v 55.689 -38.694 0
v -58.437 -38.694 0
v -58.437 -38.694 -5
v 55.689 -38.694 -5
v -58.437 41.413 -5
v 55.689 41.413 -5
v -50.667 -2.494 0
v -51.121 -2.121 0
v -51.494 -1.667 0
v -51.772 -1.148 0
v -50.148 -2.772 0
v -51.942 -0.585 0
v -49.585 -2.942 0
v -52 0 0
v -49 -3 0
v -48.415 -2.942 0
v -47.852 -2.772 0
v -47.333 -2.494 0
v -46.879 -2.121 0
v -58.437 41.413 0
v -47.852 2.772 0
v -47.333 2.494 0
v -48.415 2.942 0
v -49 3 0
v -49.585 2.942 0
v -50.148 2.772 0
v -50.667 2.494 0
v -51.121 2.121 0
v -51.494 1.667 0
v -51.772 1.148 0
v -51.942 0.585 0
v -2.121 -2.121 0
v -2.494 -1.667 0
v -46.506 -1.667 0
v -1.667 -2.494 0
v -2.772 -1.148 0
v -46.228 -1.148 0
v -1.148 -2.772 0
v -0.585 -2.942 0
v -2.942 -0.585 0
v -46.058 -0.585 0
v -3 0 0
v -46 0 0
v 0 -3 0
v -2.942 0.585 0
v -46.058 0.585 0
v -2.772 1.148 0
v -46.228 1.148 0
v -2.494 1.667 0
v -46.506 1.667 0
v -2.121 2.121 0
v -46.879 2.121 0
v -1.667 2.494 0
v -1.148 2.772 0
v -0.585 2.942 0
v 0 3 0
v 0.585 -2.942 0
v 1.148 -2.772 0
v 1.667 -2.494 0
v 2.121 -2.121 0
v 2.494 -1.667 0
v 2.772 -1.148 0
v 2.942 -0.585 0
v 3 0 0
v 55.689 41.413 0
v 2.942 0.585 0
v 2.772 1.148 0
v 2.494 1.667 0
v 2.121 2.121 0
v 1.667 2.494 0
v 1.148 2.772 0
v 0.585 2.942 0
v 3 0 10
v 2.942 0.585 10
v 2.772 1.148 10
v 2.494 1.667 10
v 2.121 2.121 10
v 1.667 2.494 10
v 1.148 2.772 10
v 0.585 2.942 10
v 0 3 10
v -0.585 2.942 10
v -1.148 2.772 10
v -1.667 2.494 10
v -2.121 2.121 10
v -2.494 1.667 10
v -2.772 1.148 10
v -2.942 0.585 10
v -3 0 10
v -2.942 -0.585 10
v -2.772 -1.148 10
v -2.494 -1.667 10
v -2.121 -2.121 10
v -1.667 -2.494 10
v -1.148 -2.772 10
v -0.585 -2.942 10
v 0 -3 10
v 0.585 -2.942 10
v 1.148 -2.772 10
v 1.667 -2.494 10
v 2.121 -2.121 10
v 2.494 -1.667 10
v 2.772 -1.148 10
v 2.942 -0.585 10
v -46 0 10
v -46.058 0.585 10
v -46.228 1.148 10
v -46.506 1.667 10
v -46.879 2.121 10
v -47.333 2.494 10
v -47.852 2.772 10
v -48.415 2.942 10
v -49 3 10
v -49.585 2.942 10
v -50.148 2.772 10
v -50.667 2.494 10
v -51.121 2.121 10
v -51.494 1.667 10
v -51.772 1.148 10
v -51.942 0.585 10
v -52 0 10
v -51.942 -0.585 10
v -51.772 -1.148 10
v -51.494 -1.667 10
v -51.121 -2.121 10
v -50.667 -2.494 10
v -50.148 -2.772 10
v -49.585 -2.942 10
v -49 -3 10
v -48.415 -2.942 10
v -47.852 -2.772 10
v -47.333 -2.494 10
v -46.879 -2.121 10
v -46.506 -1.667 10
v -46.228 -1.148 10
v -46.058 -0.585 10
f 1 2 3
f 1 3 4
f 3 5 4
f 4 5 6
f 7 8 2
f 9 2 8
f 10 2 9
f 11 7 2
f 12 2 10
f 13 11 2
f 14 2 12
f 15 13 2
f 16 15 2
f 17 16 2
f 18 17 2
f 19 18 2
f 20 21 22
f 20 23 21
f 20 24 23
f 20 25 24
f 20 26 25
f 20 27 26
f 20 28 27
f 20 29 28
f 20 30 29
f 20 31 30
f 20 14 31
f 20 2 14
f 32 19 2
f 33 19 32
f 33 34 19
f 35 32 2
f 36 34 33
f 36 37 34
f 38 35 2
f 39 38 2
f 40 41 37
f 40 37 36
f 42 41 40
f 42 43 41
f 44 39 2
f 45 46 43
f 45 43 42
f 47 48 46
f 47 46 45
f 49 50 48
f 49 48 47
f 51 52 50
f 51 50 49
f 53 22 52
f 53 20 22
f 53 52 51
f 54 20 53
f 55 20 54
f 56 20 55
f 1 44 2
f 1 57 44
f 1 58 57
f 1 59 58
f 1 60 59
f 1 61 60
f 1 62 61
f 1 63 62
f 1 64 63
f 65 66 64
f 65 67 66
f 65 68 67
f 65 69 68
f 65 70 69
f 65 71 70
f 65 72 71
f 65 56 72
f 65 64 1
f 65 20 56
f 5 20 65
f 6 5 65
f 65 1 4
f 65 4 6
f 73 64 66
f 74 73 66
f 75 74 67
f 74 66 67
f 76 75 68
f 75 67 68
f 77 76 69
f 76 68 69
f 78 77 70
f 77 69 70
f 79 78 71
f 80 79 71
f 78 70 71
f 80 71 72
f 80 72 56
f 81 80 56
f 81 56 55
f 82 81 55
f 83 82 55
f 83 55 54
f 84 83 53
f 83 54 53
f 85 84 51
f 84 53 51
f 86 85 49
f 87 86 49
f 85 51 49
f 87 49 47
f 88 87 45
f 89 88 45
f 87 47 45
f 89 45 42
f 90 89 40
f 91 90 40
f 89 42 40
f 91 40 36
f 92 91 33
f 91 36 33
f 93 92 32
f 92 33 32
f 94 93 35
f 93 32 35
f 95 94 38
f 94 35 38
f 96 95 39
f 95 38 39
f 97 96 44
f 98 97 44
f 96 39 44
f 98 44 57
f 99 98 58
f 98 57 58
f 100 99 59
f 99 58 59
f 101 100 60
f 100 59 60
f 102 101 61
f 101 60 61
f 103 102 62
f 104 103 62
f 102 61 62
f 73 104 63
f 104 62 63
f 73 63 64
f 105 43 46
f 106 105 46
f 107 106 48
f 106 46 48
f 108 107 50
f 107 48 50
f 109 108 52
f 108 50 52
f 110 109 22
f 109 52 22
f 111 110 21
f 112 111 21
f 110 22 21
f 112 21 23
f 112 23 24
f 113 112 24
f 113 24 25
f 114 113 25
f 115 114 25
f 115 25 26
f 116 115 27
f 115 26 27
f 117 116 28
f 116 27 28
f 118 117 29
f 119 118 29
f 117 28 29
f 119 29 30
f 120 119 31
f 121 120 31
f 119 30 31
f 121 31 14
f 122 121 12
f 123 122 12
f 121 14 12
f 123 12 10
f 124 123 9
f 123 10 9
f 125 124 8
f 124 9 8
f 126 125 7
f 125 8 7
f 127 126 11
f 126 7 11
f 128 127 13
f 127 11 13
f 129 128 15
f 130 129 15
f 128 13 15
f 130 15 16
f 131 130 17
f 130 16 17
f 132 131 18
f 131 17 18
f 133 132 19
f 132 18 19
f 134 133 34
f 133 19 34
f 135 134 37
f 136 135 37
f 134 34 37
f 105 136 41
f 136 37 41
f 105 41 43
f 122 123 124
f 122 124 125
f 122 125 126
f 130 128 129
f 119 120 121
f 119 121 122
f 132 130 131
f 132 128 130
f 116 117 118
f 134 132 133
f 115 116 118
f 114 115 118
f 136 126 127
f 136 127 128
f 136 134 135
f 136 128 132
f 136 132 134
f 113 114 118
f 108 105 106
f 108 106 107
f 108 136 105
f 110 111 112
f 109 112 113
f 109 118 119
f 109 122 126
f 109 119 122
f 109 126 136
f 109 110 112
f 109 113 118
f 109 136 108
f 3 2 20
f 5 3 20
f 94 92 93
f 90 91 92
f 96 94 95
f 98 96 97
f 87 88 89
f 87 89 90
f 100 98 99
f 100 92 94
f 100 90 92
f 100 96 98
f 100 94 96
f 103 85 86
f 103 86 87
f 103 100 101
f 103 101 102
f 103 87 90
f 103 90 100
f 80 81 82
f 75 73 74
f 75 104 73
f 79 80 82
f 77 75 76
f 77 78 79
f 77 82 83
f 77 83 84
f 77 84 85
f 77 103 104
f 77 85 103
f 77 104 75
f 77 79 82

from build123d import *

# Parameters (mm, degrees)
F0_R     = 3
F1_DEPTH = 10
F2_W     = 114.1267567873
F2_H     = 80.1076181233
F3_DEPTH = 5


with BuildPart() as f1:
    # F0 (on Top) → F1 (new body)
    with BuildSketch(Plane.XY):
        with Locations((-49, 0)):
            Circle(F0_R)
    extrude(amount=F1_DEPTH)



with BuildPart() as f1b:
    # F0 (on Top) → F1, piece 2 (new body)
    with BuildSketch(Plane.XY):
        with BuildLine():
            ThreePointArc((-3, 0), (0, -3), (3, 0))
            ThreePointArc((3, 0), (0, 3), (-3, 0))
        make_face()
    extrude(amount=F1_DEPTH)


with BuildPart() as f1_1:
    add(f1.part)

    add(f1b.part)  # F3 merges F1b
    # F2 (on Top) → F3 (join)
    with BuildSketch(Plane.XY):
        with Locations((-1.3738982379, 1.3595465571)):
            Rectangle(F2_W, F2_H)
    extrude(amount=-F3_DEPTH)


solid = f1_1.part
